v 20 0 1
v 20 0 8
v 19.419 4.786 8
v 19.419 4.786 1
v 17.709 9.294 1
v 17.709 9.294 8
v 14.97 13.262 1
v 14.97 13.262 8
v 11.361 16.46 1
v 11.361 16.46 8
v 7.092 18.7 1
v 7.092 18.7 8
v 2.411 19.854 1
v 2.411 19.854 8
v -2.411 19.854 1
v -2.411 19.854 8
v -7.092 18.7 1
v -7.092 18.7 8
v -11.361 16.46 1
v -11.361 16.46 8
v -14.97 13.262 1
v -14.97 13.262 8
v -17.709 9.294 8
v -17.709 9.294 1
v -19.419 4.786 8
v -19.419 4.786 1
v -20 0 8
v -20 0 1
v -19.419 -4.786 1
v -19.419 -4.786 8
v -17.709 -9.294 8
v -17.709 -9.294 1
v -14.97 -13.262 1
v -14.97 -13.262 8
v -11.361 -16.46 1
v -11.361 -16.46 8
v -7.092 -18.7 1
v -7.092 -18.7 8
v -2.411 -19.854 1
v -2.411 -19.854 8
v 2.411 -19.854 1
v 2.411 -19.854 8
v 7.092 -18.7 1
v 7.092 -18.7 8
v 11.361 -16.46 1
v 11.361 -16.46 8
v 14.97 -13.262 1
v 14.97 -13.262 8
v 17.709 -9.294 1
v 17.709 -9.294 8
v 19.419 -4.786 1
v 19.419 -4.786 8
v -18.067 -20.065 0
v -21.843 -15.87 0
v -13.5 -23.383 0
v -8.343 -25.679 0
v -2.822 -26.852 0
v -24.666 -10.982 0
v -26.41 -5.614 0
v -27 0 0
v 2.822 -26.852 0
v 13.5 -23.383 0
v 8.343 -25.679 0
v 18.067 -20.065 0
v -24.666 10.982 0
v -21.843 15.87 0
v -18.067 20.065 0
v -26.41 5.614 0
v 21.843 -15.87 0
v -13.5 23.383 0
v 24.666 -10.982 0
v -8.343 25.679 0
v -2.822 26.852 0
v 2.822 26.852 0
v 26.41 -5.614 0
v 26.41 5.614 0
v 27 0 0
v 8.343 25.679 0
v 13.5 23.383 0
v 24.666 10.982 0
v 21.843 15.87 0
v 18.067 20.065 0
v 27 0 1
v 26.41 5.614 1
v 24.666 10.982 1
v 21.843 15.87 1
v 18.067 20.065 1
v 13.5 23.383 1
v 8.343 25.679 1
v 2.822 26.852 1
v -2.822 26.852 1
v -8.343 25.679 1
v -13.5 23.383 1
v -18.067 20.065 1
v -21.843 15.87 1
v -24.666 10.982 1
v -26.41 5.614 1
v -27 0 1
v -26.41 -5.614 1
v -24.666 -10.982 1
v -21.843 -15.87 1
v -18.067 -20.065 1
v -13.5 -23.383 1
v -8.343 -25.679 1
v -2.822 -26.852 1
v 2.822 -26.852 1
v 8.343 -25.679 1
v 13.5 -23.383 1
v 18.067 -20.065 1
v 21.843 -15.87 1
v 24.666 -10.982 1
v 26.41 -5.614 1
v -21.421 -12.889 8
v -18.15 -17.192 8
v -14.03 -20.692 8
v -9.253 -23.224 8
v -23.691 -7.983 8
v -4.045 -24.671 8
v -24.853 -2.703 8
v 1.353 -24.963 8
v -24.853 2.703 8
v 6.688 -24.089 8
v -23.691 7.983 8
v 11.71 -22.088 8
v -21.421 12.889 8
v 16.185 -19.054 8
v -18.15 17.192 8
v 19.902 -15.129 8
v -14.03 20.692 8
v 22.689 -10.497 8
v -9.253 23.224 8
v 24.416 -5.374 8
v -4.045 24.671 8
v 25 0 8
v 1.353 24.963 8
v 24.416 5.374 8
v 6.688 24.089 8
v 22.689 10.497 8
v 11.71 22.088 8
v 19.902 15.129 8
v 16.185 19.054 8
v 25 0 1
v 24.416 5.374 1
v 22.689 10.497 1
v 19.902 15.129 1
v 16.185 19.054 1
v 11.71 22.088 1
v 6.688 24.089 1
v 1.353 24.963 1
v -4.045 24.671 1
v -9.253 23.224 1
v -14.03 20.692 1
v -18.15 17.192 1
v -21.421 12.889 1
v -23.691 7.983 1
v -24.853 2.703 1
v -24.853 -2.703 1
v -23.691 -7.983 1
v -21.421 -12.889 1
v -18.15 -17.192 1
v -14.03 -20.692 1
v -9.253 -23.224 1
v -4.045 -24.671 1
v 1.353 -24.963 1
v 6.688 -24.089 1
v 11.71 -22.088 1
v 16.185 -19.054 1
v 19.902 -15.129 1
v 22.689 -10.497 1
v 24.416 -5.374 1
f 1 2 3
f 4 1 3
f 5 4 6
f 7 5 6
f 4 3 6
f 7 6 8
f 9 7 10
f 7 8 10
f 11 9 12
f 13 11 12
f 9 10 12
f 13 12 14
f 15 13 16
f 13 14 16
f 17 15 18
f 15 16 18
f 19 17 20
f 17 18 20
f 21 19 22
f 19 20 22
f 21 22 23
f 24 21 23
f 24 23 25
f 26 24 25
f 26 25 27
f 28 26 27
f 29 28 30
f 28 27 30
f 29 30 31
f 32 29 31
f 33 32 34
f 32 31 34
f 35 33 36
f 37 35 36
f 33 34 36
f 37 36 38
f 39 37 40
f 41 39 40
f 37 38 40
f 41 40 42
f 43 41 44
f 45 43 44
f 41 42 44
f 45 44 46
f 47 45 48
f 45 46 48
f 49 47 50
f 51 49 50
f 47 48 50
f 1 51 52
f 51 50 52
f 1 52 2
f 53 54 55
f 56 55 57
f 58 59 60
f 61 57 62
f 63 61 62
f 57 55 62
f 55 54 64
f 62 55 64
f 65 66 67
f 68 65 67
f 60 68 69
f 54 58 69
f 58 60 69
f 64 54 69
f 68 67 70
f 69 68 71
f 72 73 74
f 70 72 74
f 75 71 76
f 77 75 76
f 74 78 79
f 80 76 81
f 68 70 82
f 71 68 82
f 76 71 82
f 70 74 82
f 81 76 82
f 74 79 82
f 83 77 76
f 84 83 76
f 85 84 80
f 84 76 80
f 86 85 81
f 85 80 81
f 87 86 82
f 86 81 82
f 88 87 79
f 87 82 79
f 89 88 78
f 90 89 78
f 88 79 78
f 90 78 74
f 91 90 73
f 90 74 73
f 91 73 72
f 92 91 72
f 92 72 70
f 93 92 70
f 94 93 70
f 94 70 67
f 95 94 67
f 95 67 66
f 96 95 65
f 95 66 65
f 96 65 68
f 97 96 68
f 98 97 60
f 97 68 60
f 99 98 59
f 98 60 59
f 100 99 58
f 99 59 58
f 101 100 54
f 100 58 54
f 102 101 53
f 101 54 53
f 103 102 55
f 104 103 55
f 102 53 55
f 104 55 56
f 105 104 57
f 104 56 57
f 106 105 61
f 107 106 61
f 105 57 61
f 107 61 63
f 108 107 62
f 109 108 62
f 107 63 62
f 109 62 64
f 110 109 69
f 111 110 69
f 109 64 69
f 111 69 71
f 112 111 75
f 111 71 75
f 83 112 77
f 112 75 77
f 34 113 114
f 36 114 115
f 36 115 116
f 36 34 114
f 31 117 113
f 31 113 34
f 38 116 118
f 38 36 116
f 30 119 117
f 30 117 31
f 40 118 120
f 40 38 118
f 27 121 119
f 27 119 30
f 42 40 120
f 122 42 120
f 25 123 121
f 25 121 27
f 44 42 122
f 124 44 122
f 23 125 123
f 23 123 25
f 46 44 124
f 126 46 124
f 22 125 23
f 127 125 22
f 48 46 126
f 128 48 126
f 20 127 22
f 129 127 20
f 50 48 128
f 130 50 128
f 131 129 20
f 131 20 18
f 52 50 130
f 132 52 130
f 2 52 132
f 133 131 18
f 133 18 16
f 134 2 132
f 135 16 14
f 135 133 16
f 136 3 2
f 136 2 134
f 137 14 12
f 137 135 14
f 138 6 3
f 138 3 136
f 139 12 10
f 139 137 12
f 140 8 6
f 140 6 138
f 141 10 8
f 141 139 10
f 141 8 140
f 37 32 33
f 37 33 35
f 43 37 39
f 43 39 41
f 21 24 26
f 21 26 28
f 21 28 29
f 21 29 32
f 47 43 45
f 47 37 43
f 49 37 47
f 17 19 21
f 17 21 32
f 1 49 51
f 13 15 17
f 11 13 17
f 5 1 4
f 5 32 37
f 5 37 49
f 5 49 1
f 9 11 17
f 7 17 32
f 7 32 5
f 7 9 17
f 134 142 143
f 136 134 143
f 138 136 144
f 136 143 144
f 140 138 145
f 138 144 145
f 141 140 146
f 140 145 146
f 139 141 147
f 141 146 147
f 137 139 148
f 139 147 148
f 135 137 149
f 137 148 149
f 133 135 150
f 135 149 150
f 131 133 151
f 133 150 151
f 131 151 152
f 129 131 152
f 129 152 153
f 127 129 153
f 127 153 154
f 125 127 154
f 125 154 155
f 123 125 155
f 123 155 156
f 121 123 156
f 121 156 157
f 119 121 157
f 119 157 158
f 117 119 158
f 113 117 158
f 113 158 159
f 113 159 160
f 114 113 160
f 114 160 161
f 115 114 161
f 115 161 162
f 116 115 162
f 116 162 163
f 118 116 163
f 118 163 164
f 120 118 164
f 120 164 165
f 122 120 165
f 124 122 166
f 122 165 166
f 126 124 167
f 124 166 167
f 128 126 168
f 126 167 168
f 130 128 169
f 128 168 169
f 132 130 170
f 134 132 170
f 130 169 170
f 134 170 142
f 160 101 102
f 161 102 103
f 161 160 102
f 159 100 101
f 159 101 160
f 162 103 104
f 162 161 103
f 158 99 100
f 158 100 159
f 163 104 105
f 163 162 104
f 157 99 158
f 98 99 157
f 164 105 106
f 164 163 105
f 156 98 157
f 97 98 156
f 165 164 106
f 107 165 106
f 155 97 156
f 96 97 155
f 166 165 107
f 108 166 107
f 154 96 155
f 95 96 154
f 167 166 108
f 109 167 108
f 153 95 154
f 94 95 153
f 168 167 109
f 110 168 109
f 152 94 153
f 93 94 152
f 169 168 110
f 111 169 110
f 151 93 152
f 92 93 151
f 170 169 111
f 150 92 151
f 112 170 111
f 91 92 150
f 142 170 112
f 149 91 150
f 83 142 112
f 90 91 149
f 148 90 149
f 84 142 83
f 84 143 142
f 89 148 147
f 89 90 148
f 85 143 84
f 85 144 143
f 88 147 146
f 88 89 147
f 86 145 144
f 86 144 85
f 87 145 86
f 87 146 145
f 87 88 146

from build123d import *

# Parameters (mm, degrees)
F0_R     = 27
F0_R_2   = 25
F1_DEPTH = 1
F2_DEPTH = 8
F3_R     = 20
F4_DEPTH = 7


with BuildPart() as f1:
    # F0 (on Top) → F1 (new body)
    with BuildSketch(Plane.XY):
        Circle(F0_R)
        Circle(F0_R_2, mode=Mode.SUBTRACT)
        Circle(F0_R_2)
    extrude(amount=F1_DEPTH)

    # F0 (on Top) → F2 (join)
    with BuildSketch(Plane.XY):
        Circle(F0_R_2)
    extrude(amount=F2_DEPTH)

    # F3 (on face) → F4 (cut)
    with BuildSketch(Plane.XY.offset(8)):
        Circle(F3_R)
    extrude(amount=-F4_DEPTH, mode=Mode.SUBTRACT)


solid = f1.part
